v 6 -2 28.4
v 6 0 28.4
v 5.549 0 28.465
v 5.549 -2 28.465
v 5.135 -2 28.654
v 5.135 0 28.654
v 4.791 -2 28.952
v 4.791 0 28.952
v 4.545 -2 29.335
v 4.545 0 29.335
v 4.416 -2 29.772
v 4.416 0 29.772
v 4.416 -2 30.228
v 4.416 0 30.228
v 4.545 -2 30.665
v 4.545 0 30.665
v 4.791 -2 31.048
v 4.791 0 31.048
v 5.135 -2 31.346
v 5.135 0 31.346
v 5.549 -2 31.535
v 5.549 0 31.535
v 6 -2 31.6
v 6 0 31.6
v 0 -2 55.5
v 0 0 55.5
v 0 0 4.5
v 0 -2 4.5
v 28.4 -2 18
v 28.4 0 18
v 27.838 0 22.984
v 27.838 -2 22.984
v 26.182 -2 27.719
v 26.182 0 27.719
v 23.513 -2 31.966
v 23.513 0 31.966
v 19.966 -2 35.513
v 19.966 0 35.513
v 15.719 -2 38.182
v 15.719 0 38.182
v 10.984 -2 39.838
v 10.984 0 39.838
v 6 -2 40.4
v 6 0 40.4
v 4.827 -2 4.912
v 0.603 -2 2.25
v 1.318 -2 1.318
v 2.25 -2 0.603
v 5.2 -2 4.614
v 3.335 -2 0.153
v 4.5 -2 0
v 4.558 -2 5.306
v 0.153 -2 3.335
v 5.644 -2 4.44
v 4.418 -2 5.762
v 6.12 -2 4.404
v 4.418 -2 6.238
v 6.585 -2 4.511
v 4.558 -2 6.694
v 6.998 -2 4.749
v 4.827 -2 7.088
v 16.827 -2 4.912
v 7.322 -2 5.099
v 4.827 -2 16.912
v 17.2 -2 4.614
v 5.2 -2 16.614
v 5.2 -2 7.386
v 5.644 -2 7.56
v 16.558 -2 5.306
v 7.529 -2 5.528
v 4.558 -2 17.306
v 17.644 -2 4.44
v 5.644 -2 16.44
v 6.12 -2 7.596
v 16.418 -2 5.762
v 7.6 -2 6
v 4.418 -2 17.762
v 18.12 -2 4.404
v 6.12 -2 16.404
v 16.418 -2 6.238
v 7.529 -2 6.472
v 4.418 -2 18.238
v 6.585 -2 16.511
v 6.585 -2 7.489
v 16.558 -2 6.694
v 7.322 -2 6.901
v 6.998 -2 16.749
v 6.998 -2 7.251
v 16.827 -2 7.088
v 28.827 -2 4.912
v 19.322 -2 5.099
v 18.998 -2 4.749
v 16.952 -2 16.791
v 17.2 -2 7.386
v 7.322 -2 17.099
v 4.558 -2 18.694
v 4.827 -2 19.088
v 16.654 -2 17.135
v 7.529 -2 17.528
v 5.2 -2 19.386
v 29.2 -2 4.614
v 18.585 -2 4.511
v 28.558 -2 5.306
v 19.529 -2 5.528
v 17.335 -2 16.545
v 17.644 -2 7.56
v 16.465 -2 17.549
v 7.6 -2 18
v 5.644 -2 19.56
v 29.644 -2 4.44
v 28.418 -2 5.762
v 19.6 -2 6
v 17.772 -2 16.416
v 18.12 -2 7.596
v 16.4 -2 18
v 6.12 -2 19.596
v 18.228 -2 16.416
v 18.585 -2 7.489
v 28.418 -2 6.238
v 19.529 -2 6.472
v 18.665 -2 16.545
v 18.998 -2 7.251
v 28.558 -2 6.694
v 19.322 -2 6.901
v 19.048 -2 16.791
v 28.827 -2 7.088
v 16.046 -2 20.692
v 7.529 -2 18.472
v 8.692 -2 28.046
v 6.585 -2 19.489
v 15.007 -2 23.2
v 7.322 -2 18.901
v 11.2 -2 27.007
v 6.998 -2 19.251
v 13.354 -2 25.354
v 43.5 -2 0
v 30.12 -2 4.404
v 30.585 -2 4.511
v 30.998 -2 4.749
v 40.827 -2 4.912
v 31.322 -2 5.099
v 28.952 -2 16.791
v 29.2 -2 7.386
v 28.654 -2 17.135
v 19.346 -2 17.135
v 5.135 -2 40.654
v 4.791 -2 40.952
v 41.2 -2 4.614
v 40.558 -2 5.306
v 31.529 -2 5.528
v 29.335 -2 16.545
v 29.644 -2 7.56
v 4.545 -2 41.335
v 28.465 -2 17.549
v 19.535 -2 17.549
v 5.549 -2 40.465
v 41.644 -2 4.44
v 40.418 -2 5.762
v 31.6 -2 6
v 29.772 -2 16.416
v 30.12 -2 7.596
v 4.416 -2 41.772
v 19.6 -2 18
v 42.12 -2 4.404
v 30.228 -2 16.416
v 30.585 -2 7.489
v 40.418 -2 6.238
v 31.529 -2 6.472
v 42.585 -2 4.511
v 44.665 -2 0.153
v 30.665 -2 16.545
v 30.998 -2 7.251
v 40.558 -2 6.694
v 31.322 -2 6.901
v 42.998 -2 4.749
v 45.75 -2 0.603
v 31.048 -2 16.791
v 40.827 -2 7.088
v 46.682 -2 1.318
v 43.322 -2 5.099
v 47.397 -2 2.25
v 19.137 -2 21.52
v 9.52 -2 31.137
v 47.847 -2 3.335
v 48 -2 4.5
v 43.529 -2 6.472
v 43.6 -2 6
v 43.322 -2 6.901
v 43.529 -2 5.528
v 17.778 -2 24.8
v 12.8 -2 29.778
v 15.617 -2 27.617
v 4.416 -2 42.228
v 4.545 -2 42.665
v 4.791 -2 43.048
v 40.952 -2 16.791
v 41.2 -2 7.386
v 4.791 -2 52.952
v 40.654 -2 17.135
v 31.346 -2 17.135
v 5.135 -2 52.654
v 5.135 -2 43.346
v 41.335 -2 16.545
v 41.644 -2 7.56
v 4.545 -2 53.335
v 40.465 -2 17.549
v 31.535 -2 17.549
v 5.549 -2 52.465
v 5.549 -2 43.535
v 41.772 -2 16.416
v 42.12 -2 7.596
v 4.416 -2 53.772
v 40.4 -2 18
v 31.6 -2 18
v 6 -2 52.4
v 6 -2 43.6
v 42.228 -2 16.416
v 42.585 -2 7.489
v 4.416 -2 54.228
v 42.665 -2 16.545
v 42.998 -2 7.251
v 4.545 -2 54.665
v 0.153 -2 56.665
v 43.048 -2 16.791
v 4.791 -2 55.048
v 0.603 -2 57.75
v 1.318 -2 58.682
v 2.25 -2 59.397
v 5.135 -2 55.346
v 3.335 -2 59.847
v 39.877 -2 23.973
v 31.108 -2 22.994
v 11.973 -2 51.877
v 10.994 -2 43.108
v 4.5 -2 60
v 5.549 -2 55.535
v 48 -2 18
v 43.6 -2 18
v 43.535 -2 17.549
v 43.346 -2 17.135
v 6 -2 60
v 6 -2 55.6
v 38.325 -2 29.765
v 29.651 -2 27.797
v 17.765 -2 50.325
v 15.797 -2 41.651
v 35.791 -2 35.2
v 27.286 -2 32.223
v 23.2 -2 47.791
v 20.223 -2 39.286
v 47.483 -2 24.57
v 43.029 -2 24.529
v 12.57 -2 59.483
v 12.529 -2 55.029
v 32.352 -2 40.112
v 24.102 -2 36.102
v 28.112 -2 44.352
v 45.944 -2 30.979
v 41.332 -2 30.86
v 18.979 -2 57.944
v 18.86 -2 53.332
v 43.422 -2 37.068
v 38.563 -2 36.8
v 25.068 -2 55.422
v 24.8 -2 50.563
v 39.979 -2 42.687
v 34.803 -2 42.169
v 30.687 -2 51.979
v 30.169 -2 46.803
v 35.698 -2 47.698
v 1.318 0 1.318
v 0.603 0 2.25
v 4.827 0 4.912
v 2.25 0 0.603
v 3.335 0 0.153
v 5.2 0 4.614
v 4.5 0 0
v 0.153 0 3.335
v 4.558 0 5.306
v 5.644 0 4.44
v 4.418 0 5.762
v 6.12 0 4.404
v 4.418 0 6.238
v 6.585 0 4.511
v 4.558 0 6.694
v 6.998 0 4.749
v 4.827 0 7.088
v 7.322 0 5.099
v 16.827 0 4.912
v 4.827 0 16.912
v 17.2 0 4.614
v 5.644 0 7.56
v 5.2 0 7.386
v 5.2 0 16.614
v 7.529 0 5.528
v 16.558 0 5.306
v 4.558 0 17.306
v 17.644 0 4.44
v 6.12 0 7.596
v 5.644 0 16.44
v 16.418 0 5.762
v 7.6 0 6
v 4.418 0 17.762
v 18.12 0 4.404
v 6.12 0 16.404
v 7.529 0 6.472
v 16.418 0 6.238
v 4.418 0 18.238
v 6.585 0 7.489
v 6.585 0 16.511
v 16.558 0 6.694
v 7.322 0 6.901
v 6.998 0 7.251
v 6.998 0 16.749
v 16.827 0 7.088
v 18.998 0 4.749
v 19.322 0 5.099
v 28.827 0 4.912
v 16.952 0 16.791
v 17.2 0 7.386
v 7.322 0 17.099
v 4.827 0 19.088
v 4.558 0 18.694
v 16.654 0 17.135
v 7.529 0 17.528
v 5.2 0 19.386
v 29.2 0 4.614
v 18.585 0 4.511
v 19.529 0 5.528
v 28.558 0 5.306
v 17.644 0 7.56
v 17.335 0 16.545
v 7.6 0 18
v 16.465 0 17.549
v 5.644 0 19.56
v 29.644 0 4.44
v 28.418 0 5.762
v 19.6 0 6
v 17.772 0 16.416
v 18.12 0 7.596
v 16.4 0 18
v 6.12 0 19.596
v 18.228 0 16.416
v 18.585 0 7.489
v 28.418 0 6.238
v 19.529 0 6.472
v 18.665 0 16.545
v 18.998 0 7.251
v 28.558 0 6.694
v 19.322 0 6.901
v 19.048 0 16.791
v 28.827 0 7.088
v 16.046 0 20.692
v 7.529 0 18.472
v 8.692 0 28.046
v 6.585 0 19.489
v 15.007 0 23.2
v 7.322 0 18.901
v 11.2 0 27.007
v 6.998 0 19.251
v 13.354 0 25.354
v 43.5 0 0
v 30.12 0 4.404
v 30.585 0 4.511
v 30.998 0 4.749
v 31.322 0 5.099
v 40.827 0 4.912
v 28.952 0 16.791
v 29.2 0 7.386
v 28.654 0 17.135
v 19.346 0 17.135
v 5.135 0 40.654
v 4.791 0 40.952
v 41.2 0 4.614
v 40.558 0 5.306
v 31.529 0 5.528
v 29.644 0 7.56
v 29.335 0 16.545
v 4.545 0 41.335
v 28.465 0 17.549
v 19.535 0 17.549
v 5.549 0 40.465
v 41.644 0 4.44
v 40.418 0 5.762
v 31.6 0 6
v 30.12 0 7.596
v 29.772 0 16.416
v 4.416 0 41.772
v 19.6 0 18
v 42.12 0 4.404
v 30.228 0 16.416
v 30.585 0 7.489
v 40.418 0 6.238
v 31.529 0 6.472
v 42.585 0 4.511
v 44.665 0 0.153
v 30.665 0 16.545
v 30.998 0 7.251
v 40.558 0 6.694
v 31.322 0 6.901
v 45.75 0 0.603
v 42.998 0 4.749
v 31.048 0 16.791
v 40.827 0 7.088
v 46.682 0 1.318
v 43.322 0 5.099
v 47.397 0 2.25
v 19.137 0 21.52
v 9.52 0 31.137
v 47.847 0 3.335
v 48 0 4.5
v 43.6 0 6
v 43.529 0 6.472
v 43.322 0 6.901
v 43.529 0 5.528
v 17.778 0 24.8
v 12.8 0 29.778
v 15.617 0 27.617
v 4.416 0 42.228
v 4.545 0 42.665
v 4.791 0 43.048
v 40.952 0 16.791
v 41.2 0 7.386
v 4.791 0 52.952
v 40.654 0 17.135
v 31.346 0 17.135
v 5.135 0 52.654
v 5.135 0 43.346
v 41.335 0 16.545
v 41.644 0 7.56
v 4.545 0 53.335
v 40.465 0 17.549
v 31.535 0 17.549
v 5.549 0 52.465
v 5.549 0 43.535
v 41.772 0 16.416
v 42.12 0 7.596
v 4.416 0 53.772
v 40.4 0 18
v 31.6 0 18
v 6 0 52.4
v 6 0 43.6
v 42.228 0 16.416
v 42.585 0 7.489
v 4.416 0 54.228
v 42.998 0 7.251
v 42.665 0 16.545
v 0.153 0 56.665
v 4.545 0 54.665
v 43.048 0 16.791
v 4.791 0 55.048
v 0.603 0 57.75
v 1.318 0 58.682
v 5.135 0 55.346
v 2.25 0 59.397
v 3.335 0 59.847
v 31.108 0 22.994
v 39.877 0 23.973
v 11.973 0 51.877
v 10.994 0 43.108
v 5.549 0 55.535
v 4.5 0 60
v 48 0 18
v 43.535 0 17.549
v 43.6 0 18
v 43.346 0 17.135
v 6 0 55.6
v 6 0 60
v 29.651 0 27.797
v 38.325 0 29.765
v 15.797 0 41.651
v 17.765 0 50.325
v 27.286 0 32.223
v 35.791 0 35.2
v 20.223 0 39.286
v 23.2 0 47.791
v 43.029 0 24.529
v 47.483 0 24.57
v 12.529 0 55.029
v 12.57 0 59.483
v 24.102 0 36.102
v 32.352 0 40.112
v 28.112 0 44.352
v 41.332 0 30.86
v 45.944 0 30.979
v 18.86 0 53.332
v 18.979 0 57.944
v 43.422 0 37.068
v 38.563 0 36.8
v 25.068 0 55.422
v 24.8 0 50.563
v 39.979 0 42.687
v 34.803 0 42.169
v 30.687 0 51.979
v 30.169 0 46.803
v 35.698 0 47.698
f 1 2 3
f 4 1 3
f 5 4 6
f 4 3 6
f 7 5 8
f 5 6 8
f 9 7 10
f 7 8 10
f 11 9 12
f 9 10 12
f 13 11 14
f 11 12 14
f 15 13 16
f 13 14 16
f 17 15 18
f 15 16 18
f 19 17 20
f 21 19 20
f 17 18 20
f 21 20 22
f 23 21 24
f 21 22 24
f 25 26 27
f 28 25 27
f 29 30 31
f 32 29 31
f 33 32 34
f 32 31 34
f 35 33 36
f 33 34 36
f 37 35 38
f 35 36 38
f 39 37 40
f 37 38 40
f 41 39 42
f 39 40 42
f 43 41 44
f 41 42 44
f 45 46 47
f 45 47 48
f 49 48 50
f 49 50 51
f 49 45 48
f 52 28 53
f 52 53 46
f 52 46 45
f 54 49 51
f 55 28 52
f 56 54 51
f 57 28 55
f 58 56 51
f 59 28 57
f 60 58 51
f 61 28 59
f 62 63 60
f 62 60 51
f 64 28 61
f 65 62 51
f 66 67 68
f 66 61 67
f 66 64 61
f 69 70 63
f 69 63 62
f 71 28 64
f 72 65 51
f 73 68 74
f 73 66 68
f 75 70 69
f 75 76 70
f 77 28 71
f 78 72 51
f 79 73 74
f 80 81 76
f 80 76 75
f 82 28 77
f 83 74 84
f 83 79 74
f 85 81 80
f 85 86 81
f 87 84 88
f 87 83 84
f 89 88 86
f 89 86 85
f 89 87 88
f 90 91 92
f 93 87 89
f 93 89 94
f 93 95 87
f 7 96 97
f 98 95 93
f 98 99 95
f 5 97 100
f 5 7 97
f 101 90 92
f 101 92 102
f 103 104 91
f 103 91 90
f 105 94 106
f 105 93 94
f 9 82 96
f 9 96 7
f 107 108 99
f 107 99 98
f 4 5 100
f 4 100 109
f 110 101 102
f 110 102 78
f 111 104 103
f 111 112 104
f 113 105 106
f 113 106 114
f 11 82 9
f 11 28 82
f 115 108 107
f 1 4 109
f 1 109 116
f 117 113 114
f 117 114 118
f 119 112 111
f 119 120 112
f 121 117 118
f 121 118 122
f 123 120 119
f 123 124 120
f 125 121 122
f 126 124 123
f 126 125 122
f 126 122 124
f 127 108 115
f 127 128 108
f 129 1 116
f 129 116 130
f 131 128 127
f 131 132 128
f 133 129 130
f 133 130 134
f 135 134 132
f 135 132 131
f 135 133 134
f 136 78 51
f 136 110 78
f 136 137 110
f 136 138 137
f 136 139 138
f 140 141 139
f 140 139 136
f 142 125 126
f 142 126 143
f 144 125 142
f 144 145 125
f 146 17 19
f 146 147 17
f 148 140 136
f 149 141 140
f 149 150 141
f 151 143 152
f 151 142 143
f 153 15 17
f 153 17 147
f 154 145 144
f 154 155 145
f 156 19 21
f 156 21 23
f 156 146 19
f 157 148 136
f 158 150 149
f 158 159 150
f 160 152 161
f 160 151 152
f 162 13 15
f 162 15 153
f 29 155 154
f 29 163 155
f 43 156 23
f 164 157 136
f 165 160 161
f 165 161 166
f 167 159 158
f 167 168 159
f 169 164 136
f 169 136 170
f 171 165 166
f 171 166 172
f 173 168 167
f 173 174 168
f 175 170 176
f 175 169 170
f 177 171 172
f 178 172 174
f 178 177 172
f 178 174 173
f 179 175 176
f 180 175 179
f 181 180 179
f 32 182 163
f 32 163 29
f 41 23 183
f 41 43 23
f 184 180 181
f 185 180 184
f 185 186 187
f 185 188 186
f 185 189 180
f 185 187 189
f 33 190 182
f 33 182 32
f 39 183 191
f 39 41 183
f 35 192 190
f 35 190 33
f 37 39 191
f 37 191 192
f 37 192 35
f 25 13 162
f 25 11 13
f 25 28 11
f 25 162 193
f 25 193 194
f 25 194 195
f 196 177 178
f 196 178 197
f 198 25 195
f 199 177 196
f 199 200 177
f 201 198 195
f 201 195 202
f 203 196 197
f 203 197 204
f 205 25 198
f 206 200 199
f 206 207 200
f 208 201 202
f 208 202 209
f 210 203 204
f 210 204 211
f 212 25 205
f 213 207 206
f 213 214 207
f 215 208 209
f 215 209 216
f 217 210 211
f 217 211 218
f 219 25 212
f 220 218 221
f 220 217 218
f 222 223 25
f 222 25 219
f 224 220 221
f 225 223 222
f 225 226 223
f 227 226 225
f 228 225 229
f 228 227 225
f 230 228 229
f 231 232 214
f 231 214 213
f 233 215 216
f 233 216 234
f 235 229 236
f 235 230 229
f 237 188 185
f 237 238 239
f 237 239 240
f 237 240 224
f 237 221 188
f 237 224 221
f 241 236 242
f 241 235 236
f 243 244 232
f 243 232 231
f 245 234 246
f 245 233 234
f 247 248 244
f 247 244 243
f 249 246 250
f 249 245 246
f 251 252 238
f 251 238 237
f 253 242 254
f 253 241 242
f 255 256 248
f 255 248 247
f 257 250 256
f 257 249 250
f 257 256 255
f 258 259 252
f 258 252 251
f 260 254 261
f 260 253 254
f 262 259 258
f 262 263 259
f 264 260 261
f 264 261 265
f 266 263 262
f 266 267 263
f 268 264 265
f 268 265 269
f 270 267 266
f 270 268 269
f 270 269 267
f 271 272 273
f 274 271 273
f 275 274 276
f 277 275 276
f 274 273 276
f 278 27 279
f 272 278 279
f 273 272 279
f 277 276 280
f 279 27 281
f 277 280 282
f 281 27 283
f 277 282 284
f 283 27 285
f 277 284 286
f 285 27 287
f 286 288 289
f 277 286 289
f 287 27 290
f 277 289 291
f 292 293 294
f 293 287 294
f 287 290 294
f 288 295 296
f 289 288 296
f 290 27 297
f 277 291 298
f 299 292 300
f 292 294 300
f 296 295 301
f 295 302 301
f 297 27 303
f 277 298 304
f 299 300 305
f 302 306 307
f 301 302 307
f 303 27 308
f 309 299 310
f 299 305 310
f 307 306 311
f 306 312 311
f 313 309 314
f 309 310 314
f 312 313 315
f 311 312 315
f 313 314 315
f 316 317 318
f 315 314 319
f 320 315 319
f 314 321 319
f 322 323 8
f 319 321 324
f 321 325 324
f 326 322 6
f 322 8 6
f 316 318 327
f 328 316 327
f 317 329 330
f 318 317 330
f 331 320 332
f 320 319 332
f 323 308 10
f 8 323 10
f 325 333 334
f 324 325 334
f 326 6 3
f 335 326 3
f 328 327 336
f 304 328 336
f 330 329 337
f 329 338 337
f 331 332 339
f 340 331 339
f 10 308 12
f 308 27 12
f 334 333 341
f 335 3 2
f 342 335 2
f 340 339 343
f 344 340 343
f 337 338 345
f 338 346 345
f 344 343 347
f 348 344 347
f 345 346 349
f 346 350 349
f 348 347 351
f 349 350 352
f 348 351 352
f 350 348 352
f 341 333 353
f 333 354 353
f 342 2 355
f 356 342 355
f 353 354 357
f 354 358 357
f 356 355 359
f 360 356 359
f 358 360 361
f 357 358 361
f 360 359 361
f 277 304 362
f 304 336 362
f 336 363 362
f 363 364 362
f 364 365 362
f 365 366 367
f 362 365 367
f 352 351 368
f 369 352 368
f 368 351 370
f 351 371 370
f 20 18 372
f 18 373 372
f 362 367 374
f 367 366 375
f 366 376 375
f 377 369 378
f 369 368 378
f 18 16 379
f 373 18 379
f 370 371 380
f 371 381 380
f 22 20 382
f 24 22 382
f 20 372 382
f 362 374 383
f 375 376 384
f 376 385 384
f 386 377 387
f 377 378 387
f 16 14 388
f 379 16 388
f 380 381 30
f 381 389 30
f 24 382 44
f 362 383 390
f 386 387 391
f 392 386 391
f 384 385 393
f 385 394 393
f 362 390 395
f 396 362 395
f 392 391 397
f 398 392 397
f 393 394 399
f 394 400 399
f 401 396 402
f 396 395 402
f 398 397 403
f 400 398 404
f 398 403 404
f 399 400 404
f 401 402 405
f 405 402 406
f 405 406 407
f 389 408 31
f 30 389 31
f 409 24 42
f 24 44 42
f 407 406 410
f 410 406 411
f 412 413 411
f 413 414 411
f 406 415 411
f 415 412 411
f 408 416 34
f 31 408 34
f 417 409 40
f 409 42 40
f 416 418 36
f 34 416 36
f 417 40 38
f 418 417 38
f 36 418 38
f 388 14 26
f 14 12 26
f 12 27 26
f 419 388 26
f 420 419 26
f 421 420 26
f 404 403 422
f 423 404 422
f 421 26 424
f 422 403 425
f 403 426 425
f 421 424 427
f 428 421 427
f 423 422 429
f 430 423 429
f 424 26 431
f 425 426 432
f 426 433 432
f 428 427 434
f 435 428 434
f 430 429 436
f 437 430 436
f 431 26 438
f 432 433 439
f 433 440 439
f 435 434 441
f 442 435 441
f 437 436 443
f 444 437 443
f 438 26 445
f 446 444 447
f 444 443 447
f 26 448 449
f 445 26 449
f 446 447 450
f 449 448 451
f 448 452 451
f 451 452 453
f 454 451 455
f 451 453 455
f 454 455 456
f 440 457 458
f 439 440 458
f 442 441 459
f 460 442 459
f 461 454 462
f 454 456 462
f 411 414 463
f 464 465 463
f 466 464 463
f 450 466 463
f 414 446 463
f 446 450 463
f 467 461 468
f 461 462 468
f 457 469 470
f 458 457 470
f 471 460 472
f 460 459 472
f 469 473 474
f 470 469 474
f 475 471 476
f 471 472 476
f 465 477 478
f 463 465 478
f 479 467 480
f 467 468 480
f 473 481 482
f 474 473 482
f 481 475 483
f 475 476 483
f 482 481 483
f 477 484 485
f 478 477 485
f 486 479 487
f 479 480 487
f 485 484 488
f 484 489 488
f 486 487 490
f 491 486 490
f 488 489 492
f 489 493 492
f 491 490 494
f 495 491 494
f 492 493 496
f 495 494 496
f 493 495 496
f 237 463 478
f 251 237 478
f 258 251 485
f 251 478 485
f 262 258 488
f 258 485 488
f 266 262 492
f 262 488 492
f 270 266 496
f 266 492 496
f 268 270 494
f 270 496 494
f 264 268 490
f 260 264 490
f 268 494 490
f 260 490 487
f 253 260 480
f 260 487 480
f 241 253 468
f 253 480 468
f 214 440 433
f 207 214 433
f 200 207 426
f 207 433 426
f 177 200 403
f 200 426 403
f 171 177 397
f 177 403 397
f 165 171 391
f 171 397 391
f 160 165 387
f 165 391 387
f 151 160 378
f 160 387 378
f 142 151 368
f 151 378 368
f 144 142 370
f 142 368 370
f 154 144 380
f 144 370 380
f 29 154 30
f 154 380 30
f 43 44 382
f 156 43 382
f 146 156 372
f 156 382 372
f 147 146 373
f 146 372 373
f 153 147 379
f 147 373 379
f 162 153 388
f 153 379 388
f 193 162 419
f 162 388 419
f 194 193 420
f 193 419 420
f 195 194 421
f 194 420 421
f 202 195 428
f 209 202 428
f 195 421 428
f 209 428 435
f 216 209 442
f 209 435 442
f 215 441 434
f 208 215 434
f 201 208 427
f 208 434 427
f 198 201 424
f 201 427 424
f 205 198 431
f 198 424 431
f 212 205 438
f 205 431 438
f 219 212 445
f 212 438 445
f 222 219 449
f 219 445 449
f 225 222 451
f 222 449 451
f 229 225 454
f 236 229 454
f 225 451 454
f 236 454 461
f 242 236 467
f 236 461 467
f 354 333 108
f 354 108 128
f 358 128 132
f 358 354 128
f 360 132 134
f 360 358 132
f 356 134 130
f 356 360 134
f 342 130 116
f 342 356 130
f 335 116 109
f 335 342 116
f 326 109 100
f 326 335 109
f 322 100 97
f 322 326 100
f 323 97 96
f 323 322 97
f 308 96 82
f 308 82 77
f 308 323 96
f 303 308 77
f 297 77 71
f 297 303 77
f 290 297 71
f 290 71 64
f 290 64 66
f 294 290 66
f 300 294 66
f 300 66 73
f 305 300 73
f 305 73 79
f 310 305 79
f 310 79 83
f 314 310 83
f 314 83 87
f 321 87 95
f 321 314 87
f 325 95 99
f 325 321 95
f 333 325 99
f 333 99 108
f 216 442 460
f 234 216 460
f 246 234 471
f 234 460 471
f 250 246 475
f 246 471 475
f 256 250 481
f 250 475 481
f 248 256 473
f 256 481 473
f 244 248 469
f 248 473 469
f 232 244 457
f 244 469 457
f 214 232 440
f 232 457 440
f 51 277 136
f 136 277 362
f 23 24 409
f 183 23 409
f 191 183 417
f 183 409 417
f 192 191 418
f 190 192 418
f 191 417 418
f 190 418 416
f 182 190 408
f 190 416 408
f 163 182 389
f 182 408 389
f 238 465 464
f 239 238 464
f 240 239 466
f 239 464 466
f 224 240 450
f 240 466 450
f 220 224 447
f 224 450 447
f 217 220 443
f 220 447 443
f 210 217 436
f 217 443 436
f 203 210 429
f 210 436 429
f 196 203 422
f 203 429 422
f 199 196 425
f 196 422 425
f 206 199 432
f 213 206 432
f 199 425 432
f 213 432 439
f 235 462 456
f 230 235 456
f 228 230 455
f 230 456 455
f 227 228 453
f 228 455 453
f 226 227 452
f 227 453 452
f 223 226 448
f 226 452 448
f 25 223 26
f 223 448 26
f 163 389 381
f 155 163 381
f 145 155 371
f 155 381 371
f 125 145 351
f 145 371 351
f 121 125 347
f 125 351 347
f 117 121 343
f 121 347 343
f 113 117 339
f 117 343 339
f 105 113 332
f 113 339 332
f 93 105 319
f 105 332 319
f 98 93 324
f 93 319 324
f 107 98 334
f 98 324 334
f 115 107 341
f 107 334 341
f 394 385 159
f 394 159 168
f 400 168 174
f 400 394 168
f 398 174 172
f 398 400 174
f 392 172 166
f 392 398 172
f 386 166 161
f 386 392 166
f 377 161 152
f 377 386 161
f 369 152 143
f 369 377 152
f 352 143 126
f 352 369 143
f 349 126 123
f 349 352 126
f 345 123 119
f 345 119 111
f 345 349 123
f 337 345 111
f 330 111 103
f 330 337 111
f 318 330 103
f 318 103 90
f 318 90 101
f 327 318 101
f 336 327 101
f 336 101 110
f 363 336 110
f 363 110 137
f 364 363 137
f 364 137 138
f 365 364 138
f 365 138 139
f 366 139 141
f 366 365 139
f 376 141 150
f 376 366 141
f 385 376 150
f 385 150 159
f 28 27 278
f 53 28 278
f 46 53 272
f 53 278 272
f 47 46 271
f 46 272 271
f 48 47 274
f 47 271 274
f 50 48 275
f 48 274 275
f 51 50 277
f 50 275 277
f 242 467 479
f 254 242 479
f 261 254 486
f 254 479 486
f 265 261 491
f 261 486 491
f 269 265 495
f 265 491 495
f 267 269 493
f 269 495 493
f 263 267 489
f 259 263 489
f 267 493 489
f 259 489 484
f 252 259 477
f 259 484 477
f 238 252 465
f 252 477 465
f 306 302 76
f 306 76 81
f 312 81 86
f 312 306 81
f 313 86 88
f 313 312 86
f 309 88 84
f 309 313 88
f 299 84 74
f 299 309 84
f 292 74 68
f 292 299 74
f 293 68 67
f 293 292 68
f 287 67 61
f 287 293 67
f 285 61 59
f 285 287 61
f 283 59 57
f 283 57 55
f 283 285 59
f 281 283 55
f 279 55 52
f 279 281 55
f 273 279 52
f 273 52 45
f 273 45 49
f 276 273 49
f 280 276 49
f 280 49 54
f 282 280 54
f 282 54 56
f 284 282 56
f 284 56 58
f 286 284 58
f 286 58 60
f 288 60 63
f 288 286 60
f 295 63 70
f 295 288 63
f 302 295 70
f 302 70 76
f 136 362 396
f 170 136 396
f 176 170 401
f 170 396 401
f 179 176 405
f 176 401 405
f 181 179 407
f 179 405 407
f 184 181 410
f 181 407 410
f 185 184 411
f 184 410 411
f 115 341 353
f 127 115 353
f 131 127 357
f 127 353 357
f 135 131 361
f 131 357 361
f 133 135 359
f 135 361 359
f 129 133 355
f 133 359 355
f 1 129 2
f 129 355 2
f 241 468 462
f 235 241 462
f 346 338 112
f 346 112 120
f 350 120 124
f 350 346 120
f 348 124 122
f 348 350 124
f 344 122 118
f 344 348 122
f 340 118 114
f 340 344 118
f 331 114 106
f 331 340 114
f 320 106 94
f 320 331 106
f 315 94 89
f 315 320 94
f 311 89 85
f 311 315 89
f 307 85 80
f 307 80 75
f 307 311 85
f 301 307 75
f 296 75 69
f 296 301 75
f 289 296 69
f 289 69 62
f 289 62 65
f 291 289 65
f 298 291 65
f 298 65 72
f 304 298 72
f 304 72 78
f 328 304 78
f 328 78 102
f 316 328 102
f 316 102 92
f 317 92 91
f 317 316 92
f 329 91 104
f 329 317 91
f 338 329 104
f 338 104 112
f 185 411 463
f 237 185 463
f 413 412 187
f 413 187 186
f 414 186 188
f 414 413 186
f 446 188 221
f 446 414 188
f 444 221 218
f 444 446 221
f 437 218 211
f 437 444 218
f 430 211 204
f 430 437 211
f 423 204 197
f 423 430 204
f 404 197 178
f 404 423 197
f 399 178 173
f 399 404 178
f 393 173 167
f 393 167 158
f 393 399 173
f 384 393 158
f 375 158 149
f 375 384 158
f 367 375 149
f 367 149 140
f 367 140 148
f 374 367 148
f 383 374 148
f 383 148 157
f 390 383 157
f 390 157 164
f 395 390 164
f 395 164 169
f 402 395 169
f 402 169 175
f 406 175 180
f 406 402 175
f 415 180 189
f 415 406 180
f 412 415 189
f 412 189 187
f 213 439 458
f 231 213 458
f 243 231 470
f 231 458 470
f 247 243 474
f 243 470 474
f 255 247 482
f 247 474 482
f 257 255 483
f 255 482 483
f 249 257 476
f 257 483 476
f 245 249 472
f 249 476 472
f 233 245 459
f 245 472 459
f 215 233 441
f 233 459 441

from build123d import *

# Parameters (mm, degrees)
F0_R     = 1.6
F1_DEPTH = 2


with BuildPart() as f1:
    # F0 (on Front) → F1 (new body)
    with BuildSketch(Plane.XZ):
        with BuildLine():
            ThreePointArc((0, 4.5), (1.318019, 1.318019), (4.5, 0))
            Line((4.5, 0), (43.5, 0))
            ThreePointArc((43.5, 0), (46.681981, 1.318019), (48, 4.5))
            Line((48, 4.5), (48, 18))
            ThreePointArc((48, 18), (35.698485, 47.698485), (6, 60))
            Line((6, 60), (4.5, 60))
            ThreePointArc((4.5, 60), (1.318019, 58.681981), (0, 55.5))
            Line((0, 55.5), (0, 4.5))
        make_face()
        with Locations((6, 6)):
            Circle(F0_R, mode=Mode.SUBTRACT)
        with Locations((18, 6)):
            Circle(F0_R, mode=Mode.SUBTRACT)
        with Locations((6, 18)):
            Circle(F0_R, mode=Mode.SUBTRACT)
        with BuildLine():
            ThreePointArc((16.4, 18), (13.353911, 25.353911), (6, 28.4))
            ThreePointArc((6, 28.4), (4.4, 30), (6, 31.6))
            ThreePointArc((6, 31.6), (15.616652, 27.616652), (19.6, 18))
            ThreePointArc((19.6, 18), (18, 16.4), (16.4, 18))
        make_face(mode=Mode.SUBTRACT)
        with Locations((30, 6)):
            Circle(F0_R, mode=Mode.SUBTRACT)
        with Locations((42, 6)):
            Circle(F0_R, mode=Mode.SUBTRACT)
        with BuildLine():
            ThreePointArc((28.4, 18), (21.839192, 33.839192), (6, 40.4))
            ThreePointArc((6, 40.4), (4.4, 42), (6, 43.6))
            ThreePointArc((6, 43.6), (24.101934, 36.101934), (31.6, 18))
            ThreePointArc((31.6, 18), (30, 16.4), (28.4, 18))
        make_face(mode=Mode.SUBTRACT)
        with BuildLine():
            ThreePointArc((40.4, 18), (30.324473, 42.324473), (6, 52.4))
            ThreePointArc((6, 52.4), (4.4, 54), (6, 55.6))
            ThreePointArc((6, 55.6), (32.587215, 44.587215), (43.6, 18))
            ThreePointArc((43.6, 18), (42, 16.4), (40.4, 18))
        make_face(mode=Mode.SUBTRACT)
    extrude(amount=F1_DEPTH)


solid = f1.part
